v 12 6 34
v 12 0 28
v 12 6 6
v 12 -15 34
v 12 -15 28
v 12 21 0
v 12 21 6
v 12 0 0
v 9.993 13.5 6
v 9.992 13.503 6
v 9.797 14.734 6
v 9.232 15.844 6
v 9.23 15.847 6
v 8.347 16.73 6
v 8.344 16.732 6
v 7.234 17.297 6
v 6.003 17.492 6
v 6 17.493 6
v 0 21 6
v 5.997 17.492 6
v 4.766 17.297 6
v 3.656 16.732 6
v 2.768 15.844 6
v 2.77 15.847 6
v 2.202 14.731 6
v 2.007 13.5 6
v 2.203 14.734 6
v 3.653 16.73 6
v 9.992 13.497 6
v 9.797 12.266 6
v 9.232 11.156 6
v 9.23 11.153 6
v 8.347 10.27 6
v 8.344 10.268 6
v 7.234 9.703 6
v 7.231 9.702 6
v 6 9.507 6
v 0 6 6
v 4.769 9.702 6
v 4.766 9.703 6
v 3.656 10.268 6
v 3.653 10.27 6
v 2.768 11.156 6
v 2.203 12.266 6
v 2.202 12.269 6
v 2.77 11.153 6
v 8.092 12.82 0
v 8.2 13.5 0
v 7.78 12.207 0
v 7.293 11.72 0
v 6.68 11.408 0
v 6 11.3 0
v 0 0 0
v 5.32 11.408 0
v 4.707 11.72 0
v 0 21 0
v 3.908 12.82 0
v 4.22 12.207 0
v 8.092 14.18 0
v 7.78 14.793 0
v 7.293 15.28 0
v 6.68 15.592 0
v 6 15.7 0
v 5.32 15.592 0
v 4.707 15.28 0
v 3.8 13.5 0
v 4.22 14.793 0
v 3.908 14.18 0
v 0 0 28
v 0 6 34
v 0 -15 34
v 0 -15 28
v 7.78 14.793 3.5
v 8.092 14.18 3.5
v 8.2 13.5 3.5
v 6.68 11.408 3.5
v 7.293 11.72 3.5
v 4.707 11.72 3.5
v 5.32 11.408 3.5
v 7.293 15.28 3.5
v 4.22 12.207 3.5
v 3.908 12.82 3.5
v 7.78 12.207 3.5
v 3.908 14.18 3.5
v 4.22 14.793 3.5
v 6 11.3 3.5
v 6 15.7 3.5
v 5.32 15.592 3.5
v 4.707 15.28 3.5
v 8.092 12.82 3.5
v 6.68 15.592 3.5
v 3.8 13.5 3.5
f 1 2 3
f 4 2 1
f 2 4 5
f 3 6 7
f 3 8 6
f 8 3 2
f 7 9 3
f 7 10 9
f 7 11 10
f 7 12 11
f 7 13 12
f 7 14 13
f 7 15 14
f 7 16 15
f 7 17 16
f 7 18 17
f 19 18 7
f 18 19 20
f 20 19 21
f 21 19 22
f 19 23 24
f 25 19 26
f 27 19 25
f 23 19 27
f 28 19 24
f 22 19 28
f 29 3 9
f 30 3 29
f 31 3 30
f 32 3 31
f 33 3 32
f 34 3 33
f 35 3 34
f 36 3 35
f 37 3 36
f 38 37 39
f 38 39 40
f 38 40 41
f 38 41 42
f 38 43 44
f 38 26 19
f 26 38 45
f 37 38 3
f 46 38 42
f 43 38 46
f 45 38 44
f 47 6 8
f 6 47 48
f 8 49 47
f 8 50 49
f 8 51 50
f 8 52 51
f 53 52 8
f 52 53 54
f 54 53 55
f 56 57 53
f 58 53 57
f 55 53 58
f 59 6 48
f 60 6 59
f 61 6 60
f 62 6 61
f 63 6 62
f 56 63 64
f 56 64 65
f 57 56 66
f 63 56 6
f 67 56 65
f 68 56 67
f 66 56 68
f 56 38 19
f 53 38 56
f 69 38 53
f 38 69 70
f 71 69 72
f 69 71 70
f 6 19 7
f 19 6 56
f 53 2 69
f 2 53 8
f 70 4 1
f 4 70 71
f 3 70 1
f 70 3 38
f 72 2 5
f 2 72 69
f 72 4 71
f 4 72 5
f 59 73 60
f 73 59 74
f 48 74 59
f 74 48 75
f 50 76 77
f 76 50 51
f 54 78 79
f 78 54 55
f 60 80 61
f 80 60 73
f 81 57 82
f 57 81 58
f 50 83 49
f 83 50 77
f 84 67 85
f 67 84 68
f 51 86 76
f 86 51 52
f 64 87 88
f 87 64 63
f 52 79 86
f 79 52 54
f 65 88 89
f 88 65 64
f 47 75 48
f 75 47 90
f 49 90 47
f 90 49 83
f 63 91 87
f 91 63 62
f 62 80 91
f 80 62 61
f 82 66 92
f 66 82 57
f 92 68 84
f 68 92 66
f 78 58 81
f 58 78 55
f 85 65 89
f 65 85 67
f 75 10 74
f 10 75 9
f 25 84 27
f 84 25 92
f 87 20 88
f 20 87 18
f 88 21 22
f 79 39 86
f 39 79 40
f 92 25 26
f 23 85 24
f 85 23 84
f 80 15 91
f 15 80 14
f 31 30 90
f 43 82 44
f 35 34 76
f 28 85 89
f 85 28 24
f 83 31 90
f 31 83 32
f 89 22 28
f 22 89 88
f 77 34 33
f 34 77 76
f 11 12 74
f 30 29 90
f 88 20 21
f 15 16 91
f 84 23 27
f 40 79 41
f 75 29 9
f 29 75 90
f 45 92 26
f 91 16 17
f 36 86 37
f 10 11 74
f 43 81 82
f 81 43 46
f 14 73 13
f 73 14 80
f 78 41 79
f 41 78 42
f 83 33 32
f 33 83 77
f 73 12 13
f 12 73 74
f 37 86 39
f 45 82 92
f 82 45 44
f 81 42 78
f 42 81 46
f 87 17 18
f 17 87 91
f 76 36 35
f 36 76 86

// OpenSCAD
hole_d = 3.4 + 1;

head_d = 7.0 + 1;
head_h = 2.5;

hook_w = 12;
hook_h = 28;
hook_l= 15;

wall_w = 6;

difference(){
    union(){
        cube( [ hook_w, hook_l + wall_w, wall_w ] );
        cube( [ hook_w, wall_w, hook_h + wall_w ] );
        translate( [ 0, -hook_l, hook_h ] )
            cube( [ hook_w, hook_l + wall_w, wall_w ] );
    }
    translate( [ hook_w / 2, wall_w + hook_l / 2, -1 ] )
        cylinder( d = hole_d, h = wall_w + 2, $fn = 20 );
    translate( [ hook_w / 2, wall_w + hook_l / 2, wall_w - head_h ] )
        cylinder( d2 = head_d, d1 = hole_d, h = head_h + 1e-2, $fn = 20 );
}
